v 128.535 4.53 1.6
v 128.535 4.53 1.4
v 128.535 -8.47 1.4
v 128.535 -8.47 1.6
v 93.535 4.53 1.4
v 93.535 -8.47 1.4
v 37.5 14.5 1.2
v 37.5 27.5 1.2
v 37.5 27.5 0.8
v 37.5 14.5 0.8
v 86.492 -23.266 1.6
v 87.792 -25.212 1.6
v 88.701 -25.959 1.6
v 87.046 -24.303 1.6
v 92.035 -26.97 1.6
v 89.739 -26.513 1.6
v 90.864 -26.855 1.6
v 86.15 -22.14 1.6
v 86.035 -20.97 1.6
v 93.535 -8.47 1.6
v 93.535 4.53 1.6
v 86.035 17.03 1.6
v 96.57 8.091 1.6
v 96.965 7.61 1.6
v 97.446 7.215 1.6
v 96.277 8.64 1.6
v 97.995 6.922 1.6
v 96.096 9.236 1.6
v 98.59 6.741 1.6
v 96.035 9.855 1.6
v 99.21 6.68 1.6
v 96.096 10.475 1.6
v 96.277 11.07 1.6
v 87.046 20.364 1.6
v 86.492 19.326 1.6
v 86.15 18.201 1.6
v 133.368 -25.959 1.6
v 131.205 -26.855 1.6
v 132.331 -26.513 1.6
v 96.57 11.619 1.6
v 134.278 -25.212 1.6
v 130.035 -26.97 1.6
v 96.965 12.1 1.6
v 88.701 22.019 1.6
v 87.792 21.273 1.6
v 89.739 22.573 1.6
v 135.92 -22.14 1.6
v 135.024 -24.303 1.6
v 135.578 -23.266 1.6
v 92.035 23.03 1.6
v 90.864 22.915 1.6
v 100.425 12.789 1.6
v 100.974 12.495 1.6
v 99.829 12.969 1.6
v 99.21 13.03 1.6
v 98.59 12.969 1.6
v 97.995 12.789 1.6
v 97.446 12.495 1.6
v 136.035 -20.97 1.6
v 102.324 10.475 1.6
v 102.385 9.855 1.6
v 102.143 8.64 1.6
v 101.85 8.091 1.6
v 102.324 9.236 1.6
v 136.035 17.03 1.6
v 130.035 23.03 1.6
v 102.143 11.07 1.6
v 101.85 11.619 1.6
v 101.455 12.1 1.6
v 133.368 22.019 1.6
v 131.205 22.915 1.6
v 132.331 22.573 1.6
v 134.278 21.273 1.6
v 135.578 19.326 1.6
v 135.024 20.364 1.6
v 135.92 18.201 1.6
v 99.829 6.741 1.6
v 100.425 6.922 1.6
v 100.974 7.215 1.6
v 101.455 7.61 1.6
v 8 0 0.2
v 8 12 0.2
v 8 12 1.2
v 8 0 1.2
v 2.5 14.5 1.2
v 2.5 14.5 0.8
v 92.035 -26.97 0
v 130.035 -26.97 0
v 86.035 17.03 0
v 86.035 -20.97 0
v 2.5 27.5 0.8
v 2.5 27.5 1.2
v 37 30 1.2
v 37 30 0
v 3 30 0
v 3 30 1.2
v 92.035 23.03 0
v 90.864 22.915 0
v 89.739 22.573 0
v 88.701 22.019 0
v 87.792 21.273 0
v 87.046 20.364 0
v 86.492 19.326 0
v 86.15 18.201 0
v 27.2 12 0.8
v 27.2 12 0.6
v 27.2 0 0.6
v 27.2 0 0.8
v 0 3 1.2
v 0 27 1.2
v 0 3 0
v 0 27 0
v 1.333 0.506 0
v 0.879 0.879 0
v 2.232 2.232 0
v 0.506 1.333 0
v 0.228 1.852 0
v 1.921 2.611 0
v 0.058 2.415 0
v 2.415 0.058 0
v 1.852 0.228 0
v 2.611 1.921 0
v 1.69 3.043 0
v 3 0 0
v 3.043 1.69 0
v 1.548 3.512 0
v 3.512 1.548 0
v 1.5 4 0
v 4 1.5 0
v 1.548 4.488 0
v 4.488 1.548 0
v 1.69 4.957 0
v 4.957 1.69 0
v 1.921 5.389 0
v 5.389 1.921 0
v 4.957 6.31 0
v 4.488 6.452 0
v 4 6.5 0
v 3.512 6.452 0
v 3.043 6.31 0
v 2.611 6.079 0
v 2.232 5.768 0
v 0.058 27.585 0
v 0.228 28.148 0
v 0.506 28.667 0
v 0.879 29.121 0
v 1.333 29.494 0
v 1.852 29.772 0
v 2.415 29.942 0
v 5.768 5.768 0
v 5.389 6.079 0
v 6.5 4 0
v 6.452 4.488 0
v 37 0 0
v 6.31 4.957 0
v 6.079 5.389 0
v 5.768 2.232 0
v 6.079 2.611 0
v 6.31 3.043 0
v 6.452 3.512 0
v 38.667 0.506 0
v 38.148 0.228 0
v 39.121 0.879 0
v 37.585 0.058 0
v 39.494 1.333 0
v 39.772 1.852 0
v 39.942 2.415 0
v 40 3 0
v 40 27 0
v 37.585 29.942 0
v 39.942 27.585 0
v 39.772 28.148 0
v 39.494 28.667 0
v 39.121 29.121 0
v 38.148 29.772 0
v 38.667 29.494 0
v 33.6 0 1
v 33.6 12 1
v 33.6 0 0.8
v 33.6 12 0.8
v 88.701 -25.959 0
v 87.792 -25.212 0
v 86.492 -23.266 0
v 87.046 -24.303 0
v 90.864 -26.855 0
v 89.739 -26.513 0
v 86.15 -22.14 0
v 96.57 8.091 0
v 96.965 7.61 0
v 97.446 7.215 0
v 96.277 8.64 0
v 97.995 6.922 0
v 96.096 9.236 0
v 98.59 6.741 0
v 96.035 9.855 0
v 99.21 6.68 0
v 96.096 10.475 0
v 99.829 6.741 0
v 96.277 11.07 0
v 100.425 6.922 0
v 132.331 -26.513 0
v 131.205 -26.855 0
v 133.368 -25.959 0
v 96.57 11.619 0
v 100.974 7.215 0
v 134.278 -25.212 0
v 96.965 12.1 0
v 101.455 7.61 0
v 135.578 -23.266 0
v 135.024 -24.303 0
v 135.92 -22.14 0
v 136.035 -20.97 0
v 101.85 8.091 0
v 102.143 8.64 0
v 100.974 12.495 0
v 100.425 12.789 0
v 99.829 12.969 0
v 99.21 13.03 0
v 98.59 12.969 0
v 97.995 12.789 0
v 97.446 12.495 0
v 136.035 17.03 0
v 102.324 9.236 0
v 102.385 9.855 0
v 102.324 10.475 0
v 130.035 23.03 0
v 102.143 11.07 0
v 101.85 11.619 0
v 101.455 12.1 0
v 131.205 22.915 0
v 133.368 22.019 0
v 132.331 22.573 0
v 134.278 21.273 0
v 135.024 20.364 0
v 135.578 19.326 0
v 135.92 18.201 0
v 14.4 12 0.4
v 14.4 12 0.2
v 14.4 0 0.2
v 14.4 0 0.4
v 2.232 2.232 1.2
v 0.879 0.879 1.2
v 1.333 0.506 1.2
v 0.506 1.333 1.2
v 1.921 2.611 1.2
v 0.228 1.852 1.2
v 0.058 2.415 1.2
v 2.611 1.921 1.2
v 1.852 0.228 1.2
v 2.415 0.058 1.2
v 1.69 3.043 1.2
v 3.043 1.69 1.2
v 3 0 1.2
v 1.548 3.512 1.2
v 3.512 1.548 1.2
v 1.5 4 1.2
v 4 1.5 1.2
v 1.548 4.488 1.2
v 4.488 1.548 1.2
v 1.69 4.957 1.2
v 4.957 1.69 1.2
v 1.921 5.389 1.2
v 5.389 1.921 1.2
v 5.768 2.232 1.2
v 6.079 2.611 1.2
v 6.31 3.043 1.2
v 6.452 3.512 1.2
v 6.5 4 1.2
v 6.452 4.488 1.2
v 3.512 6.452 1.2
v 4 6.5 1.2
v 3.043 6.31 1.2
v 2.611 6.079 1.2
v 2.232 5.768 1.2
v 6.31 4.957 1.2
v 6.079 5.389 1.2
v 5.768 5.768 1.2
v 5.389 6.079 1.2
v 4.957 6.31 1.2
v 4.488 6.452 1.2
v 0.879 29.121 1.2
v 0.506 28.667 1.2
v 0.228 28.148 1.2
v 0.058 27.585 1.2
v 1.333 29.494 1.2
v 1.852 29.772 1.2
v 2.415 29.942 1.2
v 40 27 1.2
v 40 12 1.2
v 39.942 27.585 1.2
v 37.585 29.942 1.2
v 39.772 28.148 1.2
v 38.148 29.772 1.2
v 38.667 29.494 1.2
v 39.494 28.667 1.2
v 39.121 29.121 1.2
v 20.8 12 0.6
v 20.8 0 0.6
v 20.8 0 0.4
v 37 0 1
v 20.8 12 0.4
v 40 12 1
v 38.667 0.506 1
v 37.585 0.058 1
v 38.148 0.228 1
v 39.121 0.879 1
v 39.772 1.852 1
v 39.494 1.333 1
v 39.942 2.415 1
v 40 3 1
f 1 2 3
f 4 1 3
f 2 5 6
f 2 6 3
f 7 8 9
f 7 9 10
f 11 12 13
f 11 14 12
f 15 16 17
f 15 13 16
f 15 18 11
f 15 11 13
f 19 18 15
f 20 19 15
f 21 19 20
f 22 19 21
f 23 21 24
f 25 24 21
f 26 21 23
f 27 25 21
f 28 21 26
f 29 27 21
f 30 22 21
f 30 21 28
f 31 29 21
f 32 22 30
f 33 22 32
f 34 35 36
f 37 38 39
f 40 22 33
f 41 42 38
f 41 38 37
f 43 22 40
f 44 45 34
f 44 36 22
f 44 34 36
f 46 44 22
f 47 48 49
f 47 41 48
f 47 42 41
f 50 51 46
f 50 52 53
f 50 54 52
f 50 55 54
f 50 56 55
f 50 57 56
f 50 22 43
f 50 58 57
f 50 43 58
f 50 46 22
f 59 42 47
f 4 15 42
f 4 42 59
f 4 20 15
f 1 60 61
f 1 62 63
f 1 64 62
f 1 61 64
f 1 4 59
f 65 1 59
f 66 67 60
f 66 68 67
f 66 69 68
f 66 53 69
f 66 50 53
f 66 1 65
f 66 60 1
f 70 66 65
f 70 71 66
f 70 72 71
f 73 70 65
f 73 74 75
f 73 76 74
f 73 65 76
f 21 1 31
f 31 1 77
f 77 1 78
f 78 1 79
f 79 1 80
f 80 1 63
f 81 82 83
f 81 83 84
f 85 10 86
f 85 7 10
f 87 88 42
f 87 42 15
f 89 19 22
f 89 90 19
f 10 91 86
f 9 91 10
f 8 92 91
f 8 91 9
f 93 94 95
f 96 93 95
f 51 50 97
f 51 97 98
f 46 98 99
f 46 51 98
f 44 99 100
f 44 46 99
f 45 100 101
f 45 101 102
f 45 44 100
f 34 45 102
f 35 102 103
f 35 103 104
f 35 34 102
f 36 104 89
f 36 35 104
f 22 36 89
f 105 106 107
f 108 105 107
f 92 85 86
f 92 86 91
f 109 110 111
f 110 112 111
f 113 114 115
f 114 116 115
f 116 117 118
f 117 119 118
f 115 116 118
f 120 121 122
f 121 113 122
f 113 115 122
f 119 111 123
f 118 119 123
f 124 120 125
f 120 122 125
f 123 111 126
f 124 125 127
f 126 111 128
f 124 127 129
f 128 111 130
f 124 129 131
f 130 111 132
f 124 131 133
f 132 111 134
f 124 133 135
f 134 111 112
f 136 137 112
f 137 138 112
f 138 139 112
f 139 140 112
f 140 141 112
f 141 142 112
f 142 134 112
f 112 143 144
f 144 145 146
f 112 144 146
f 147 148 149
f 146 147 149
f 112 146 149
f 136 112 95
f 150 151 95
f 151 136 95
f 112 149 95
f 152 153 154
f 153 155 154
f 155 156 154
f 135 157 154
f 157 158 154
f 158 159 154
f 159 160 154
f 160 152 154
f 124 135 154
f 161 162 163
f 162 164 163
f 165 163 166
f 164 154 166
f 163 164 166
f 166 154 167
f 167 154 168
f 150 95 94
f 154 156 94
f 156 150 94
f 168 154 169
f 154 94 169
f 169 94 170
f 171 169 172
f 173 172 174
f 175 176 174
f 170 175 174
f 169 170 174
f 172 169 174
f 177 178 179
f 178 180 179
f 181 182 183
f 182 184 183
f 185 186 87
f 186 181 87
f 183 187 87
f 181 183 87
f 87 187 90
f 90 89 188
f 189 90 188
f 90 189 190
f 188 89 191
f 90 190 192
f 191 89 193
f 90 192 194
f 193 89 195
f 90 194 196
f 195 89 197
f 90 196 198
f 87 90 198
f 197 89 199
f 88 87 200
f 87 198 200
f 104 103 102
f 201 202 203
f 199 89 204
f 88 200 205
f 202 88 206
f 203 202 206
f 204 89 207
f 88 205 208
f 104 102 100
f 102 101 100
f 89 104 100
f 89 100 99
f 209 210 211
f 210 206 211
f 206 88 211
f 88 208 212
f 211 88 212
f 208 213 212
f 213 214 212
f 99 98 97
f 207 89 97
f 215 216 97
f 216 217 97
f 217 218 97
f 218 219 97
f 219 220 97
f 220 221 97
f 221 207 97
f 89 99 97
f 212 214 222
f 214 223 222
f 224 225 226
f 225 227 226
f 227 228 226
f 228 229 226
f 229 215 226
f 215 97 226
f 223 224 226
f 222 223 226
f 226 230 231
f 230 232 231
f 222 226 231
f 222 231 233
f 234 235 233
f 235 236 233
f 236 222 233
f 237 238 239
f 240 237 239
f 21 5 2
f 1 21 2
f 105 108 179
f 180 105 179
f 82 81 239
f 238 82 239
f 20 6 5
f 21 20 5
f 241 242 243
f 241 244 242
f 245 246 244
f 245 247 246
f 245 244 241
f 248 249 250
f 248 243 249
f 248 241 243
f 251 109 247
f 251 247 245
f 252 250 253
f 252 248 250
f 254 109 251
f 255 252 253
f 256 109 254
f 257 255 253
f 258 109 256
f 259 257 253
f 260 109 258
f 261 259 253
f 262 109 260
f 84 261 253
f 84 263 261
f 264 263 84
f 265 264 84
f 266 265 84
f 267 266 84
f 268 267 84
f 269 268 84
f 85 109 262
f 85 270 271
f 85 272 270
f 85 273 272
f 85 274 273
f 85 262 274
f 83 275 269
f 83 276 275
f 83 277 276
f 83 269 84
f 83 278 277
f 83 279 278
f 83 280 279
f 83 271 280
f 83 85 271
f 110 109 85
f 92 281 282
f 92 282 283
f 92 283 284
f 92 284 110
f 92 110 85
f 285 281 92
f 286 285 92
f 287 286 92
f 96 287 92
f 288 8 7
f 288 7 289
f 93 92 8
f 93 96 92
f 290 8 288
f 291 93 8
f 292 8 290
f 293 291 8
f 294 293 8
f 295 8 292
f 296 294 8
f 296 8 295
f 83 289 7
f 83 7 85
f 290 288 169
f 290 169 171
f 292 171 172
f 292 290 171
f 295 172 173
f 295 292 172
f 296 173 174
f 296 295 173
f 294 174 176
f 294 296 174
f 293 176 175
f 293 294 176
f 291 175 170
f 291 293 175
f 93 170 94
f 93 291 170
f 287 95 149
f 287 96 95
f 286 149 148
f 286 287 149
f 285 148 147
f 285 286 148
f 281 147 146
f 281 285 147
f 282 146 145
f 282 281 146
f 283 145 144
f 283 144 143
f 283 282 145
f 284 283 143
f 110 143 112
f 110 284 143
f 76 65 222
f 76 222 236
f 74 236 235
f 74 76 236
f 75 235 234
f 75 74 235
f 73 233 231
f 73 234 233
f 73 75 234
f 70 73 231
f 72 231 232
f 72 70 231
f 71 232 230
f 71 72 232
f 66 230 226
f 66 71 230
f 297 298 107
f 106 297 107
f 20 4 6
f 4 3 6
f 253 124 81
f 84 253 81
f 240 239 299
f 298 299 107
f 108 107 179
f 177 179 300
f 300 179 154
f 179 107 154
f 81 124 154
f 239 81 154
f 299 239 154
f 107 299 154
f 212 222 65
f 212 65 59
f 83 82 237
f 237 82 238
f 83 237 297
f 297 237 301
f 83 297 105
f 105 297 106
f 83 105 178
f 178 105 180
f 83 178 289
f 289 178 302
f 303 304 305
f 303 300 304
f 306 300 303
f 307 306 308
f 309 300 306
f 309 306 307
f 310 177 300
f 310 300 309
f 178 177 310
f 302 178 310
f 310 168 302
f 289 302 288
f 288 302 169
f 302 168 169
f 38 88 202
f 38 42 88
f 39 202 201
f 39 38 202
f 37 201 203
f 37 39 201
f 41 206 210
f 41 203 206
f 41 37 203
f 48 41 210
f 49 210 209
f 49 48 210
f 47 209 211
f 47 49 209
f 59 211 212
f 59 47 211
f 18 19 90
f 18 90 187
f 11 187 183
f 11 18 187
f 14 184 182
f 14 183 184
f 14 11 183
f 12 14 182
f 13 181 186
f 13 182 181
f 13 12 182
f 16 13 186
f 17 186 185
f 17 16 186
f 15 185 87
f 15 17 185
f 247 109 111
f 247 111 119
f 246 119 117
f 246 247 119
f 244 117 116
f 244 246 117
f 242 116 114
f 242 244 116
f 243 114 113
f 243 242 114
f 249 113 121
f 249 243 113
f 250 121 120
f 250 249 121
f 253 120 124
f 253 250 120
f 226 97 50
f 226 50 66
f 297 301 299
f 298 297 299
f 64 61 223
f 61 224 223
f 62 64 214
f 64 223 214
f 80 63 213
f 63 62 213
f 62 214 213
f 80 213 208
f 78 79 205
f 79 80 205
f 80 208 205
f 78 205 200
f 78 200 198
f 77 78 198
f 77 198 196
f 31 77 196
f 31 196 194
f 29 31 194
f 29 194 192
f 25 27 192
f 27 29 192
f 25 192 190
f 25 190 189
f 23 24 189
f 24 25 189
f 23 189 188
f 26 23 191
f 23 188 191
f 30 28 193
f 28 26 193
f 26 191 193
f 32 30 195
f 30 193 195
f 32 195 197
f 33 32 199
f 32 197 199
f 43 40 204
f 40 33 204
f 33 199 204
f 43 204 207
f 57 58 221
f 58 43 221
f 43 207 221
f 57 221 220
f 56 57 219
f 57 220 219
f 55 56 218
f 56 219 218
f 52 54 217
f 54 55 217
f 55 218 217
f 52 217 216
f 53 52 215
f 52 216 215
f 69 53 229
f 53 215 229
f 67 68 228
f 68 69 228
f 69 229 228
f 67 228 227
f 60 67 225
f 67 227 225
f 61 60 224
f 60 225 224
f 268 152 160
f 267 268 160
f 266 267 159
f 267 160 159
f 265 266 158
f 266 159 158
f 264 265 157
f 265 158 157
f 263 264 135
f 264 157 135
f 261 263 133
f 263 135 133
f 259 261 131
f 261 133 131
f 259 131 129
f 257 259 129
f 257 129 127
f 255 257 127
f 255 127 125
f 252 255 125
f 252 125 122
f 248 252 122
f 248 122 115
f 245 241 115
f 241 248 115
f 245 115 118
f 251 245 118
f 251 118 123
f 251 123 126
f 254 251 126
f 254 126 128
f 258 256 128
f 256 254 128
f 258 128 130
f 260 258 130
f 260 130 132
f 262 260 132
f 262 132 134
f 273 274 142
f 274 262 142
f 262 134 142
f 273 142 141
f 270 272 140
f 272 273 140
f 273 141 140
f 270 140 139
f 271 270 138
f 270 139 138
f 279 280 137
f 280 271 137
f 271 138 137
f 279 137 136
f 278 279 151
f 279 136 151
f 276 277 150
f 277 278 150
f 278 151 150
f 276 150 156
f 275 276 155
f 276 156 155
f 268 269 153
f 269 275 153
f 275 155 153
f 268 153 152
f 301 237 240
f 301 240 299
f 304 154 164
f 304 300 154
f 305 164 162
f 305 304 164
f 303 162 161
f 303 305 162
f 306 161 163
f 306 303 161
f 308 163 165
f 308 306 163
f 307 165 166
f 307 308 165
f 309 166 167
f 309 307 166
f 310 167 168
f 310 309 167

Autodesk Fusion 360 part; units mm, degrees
sketch "Sketch1" plane through (0, 0, 0) normal (0, 0, 1) x (1, 0, 0)
  line L0 (0, 0) -> (40, 0)
  line L1 (40, 0) -> (40, 30)
  line L2 (40, 30) -> (0, 30)
  line L3 (0, 30) -> (0, 0)
  line L4 (0, 12) -> (40, 12)
  line L5 (8, 12) -> (8, 0)
  line L6 (14.4, 12) -> (14.4, 0)
  line L7 (20.8, 12) -> (20.8, 0)
  line L8 (27.2, 12) -> (27.2, 0)
  line L9 (33.6, 12) -> (33.6, 0)
  circle A0 centre (4, 4) radius 2.5
  line L10 (2.5, 27.5) -> (37.5, 27.5)
  line L11 (37.5, 27.5) -> (37.5, 14.5)
  line L12 (37.5, 14.5) -> (2.5, 14.5)
  line L13 (2.5, 14.5) -> (2.5, 27.5)
  line L14 (8, 4) -> (0, 4) construction
  dimension "d3" = 6.4
  dimension "d4" = 6.4
  dimension "d5" = 6.4
  dimension "d6" = 6.4
  dimension "d9" = 40
  dimension "d24" = 5
  dimension "d29" = 13
  dimension "d32" = 30
  dimension "d33" = 2.5
  dimension "d34" = 2.5
  dimension "d35" = 2.5
  dimension "d39" = 2.5
  dimension "d42" = 12
  dimension "d43" = 35
  dimension "d44" = 4
  dimension "d45" = 8
extrude "Extrude1" add sketch "Sketch1" along normal blind 1.2 contours L0 L3 L4 L5 | L1 L2 L3 L4 | A0 | L10 L11 L12 L13 makes body 1
extrude "Extrude2" add sketch "Sketch1" along normal blind 0.2 contours L0 L4 L5 L6 bodies 1
extrude "Extrude3" add sketch "Sketch1" along normal blind 0.4 contours L0 L4 L6 L7 bodies 1
extrude "Extrude4" add sketch "Sketch1" along normal blind 0.6 contours L0 L4 L7 L8 bodies 1
extrude "Extrude5" add sketch "Sketch1" along normal blind 0.8 contours L0 L4 L8 L9 bodies 1
extrude "Extrude6" add sketch "Sketch1" along normal blind 1 contours L0 L1 L4 L9 bodies 1
extrude "Extrude7" cut sketch "Sketch1" along normal up to surface (1.2 mm away) contours A0 bodies 1
extrude "Extrude8" cut sketch "Sketch1" against normal blind 0.4 from surface at 1.2 contours L10 L11 L12 L13 bodies 1
fillet "Fillet1" radius 3 4 edges at (0, 0, 0.6) (0, 30, 0.6) (40, 30, 0.6) (40, 0, 0.5) on bodies 1
sketch "Sketch1 (2)" plane through (0, 0, 0) normal (0, 0, 1) x (1, 0, 0) in component "Flexible swatch "
  line L0 (93.5349, 4.5302) -> (128.5349, 4.5302)
  line L1 (128.5349, 4.5302) -> (128.5349, -8.4698)
  line L2 (128.5349, -8.4698) -> (93.5349, -8.4698)
  line L3 (93.5349, -8.4698) -> (93.5349, 4.5302)
  line L4 (111.0349, 4.5302) -> (111.0349, -8.4698) construction
  line L5 (86.0349, 23.0302) -> (136.0349, 23.0302)
  line L6 (136.0349, 23.0302) -> (136.0349, -26.9698)
  line L7 (136.0349, -26.9698) -> (86.0349, -26.9698)
  line L8 (86.0349, -26.9698) -> (86.0349, 23.0302)
  line L9 (86.0349, 23.0302) -> (136.0349, -26.9698) construction
  line L10 (136.0349, 23.0302) -> (86.0349, -26.9698) construction
  circle A0 centre (99.2099, 9.8552) radius 3.175
  line L11 (96.0349, 9.8552) -> (96.0349, 15.7856) construction
  point P0 (111.0349, -1.9698)
  dimension "d46" = 13
  dimension "d47" = 35
  dimension "d48" = 50
  dimension "d49" = 50
  dimension "d56" = 6.35
  dimension "d59" = 13.175
  dimension "d60" = 13.175
extrude "Extrude1'" add sketch "Sketch1 (2)" along normal blind 1.6 separate body makes body 2 in component "Flexible swatch "
fillet "Fillet1'" radius 6 4 edges at (86.0349, -26.9698, 0.8) (86.0349, 23.0302, 0.8) (136.0349, -26.9698, 0.8) (136.0349, 23.0302, 0.8) on bodies 2 in component "Flexible swatch "
extrude "Extrude2'" add sketch "Sketch1 (2)" along normal blind 1.4 contours L0 L1 L2 L3 bodies 2 in component "Flexible swatch "
component "Flexible swatch " placed x (1, 0, 0) y (0, 1, 0) z (0, 0, 1) at (0, 0, 0)
equation "d3 = ( d9 - d45 ) / 5"
equation "d4 = d3"
equation "d5 = d3"
equation "d6 = d3"
equation "d49 = d48"
equation "d59 = 10 mm + ( 0.5 * d56 )"
equation "d60 = d59"
